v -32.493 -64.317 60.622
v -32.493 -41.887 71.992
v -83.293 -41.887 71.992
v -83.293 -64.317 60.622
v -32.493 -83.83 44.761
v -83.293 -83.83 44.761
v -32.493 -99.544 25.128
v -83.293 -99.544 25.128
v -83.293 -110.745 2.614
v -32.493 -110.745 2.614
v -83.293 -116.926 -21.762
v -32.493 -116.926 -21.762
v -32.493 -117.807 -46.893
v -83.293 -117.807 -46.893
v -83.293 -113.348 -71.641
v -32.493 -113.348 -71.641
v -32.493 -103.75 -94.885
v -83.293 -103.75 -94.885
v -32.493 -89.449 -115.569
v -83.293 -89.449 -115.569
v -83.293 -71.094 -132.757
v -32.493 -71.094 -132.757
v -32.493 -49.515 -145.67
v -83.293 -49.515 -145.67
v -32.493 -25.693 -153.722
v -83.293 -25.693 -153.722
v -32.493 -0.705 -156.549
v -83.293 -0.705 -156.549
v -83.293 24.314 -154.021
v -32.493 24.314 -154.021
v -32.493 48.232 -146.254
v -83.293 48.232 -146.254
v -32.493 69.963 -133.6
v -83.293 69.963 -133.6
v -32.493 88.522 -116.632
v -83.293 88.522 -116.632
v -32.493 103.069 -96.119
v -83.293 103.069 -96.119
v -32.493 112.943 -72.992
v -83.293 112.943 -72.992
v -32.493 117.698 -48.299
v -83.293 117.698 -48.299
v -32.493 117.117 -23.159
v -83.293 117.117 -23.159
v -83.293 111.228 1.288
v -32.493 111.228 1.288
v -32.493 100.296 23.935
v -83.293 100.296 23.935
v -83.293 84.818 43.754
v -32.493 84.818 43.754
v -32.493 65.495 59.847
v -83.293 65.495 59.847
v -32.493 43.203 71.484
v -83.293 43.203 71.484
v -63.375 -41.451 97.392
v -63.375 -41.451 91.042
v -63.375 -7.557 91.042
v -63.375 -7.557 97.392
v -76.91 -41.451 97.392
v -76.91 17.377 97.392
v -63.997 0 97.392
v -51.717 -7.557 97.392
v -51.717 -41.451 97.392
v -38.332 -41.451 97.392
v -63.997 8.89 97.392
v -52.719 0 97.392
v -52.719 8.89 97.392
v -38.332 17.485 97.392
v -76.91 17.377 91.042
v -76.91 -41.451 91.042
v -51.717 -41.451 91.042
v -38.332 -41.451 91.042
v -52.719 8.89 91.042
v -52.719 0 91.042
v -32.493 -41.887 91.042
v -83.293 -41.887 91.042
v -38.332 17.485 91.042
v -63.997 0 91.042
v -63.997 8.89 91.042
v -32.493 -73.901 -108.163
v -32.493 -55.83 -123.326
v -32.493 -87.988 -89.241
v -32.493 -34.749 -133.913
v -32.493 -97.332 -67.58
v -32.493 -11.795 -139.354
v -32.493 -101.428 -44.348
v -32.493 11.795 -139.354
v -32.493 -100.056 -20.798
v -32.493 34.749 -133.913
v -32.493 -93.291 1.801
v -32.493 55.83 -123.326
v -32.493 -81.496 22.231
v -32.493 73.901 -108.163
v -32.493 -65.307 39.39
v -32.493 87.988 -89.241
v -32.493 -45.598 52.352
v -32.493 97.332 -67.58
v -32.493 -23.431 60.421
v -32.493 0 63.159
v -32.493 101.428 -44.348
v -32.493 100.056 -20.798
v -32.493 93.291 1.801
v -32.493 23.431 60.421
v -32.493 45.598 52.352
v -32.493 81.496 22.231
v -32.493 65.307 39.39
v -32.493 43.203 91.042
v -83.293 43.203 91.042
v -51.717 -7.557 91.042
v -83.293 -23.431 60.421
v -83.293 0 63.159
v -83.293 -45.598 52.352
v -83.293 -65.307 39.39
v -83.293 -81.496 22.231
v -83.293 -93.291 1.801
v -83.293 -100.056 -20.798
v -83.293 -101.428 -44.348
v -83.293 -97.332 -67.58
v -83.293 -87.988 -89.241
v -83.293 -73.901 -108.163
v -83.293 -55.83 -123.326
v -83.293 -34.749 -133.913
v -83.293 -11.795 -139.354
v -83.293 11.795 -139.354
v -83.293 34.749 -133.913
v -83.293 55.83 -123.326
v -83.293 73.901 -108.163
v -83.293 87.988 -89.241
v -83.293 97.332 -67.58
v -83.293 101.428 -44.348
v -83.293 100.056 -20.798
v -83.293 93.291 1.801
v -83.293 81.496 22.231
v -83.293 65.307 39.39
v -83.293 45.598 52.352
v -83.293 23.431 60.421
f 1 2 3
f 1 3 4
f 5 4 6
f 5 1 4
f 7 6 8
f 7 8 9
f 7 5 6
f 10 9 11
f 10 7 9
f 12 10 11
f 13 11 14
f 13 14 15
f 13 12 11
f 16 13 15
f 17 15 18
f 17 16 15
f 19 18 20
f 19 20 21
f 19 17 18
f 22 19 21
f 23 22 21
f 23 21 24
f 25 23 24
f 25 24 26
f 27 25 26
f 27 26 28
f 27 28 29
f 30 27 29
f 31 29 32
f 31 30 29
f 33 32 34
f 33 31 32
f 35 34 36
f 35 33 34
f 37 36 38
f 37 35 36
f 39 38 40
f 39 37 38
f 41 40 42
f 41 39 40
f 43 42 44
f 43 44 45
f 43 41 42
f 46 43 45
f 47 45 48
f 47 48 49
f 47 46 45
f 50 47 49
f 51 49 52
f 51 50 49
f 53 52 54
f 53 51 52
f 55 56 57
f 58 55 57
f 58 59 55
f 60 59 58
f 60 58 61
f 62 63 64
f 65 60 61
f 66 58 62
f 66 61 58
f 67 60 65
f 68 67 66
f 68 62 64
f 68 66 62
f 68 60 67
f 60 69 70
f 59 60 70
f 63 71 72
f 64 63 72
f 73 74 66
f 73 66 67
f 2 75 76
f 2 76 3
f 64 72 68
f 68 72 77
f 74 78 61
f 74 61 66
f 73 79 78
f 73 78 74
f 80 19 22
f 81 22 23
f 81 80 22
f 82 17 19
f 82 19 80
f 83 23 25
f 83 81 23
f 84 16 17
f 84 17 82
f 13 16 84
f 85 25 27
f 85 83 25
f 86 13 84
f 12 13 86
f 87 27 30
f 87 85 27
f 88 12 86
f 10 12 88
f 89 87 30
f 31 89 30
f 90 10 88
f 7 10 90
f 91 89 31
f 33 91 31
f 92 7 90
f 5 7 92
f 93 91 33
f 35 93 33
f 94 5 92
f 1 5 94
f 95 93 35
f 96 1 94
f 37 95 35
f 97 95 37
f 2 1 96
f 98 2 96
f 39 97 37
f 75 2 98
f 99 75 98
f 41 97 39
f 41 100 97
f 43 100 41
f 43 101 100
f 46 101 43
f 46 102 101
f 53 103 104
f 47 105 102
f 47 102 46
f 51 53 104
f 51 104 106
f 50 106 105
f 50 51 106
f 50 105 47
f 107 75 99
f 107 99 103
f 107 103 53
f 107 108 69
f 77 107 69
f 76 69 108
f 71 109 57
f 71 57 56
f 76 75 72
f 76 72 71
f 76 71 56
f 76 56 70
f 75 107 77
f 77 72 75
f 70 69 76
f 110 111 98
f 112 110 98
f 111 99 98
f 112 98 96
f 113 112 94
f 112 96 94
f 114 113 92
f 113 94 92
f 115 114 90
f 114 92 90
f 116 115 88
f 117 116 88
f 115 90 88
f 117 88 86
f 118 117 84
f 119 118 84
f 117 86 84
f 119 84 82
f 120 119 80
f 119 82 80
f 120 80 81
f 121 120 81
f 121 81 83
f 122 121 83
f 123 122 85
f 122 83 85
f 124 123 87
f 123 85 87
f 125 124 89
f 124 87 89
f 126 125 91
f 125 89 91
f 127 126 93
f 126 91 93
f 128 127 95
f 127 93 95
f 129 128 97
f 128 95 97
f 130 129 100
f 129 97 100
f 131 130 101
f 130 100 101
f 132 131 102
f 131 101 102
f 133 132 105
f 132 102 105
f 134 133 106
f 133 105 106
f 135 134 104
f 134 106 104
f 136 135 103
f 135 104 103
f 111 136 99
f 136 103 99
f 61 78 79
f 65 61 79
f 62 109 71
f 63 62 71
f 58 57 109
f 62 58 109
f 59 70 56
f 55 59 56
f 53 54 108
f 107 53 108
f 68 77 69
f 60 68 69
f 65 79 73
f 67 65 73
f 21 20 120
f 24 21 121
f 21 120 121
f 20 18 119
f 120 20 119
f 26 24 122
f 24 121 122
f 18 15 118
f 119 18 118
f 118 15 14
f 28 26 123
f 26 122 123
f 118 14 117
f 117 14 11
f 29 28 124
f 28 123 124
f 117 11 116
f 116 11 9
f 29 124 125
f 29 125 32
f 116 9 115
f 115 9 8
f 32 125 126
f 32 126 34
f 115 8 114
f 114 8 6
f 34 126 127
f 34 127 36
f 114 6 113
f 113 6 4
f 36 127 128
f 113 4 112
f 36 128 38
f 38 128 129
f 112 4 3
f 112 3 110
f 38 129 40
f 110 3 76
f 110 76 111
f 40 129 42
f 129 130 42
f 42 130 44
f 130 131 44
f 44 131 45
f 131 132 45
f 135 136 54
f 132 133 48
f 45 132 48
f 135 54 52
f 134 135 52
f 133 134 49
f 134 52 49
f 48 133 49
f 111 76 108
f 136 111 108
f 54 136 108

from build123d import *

# Parameters (mm, degrees)
F0_W     = 50.8
F0_H     = 16.51
F3_DEPTH = 50.8
F6_DEPTH = 6.35
F4_W     = 11.2776
F4_H     = 8.89
F7_DEPTH = 6.35


with BuildPart() as f1:
    # F0 (on Front) → F1 (revolve)
    with BuildSketch(Plane.XZ):
        with Locations((-57.8927400278, 71.4143859753)):
            Rectangle(F0_W, F0_H)
    revolve(axis=Axis((-60.0075013936, 0, -38.4406140247), (1, 0, 0)))

    # F2 (on face) → F3 (join)
    with BuildSketch(Plane.YZ.offset(-32.4927400278)):
        with BuildLine():
            ThreePointArc((-41.8872153091, 71.992321704), (0.7051217623, 79.667281153), (43.2027846909, 71.484321704))
            Line((43.2027846909, 71.484321704), (43.2027846909, 91.042321704))
            Line((43.2027846909, 91.042321704), (-41.8872153091, 91.042321704))
            Line((-41.8872153091, 91.042321704), (-41.8872153091, 71.992321704))
        make_face()
    extrude(amount=-F3_DEPTH)

    # F5 (on face) → F6 (join)
    with BuildSketch(Plane.XY.offset(91.042321704)):
        Polygon((-38.3323021233, 17.4853205681), (-76.9100263715, 17.3771120608), (-76.9100263715, -41.4511188865), (-63.3748918772, -41.4511188865), (-63.3748918772, -7.5572687201), (-51.7171360552, -7.5572687201), (-51.7171360552, -41.4511188865), (-38.3323021233, -41.4511188865), align=None)
    extrude(amount=F6_DEPTH)

    # F4 (on face) → F7 (cut)
    with BuildSketch(Plane.XY.offset(91.042321704)):
        with Locations((-58.3582898628, 4.445)):
            Rectangle(F4_W, F4_H)
    extrude(amount=F7_DEPTH, mode=Mode.SUBTRACT)


solid = f1.part
